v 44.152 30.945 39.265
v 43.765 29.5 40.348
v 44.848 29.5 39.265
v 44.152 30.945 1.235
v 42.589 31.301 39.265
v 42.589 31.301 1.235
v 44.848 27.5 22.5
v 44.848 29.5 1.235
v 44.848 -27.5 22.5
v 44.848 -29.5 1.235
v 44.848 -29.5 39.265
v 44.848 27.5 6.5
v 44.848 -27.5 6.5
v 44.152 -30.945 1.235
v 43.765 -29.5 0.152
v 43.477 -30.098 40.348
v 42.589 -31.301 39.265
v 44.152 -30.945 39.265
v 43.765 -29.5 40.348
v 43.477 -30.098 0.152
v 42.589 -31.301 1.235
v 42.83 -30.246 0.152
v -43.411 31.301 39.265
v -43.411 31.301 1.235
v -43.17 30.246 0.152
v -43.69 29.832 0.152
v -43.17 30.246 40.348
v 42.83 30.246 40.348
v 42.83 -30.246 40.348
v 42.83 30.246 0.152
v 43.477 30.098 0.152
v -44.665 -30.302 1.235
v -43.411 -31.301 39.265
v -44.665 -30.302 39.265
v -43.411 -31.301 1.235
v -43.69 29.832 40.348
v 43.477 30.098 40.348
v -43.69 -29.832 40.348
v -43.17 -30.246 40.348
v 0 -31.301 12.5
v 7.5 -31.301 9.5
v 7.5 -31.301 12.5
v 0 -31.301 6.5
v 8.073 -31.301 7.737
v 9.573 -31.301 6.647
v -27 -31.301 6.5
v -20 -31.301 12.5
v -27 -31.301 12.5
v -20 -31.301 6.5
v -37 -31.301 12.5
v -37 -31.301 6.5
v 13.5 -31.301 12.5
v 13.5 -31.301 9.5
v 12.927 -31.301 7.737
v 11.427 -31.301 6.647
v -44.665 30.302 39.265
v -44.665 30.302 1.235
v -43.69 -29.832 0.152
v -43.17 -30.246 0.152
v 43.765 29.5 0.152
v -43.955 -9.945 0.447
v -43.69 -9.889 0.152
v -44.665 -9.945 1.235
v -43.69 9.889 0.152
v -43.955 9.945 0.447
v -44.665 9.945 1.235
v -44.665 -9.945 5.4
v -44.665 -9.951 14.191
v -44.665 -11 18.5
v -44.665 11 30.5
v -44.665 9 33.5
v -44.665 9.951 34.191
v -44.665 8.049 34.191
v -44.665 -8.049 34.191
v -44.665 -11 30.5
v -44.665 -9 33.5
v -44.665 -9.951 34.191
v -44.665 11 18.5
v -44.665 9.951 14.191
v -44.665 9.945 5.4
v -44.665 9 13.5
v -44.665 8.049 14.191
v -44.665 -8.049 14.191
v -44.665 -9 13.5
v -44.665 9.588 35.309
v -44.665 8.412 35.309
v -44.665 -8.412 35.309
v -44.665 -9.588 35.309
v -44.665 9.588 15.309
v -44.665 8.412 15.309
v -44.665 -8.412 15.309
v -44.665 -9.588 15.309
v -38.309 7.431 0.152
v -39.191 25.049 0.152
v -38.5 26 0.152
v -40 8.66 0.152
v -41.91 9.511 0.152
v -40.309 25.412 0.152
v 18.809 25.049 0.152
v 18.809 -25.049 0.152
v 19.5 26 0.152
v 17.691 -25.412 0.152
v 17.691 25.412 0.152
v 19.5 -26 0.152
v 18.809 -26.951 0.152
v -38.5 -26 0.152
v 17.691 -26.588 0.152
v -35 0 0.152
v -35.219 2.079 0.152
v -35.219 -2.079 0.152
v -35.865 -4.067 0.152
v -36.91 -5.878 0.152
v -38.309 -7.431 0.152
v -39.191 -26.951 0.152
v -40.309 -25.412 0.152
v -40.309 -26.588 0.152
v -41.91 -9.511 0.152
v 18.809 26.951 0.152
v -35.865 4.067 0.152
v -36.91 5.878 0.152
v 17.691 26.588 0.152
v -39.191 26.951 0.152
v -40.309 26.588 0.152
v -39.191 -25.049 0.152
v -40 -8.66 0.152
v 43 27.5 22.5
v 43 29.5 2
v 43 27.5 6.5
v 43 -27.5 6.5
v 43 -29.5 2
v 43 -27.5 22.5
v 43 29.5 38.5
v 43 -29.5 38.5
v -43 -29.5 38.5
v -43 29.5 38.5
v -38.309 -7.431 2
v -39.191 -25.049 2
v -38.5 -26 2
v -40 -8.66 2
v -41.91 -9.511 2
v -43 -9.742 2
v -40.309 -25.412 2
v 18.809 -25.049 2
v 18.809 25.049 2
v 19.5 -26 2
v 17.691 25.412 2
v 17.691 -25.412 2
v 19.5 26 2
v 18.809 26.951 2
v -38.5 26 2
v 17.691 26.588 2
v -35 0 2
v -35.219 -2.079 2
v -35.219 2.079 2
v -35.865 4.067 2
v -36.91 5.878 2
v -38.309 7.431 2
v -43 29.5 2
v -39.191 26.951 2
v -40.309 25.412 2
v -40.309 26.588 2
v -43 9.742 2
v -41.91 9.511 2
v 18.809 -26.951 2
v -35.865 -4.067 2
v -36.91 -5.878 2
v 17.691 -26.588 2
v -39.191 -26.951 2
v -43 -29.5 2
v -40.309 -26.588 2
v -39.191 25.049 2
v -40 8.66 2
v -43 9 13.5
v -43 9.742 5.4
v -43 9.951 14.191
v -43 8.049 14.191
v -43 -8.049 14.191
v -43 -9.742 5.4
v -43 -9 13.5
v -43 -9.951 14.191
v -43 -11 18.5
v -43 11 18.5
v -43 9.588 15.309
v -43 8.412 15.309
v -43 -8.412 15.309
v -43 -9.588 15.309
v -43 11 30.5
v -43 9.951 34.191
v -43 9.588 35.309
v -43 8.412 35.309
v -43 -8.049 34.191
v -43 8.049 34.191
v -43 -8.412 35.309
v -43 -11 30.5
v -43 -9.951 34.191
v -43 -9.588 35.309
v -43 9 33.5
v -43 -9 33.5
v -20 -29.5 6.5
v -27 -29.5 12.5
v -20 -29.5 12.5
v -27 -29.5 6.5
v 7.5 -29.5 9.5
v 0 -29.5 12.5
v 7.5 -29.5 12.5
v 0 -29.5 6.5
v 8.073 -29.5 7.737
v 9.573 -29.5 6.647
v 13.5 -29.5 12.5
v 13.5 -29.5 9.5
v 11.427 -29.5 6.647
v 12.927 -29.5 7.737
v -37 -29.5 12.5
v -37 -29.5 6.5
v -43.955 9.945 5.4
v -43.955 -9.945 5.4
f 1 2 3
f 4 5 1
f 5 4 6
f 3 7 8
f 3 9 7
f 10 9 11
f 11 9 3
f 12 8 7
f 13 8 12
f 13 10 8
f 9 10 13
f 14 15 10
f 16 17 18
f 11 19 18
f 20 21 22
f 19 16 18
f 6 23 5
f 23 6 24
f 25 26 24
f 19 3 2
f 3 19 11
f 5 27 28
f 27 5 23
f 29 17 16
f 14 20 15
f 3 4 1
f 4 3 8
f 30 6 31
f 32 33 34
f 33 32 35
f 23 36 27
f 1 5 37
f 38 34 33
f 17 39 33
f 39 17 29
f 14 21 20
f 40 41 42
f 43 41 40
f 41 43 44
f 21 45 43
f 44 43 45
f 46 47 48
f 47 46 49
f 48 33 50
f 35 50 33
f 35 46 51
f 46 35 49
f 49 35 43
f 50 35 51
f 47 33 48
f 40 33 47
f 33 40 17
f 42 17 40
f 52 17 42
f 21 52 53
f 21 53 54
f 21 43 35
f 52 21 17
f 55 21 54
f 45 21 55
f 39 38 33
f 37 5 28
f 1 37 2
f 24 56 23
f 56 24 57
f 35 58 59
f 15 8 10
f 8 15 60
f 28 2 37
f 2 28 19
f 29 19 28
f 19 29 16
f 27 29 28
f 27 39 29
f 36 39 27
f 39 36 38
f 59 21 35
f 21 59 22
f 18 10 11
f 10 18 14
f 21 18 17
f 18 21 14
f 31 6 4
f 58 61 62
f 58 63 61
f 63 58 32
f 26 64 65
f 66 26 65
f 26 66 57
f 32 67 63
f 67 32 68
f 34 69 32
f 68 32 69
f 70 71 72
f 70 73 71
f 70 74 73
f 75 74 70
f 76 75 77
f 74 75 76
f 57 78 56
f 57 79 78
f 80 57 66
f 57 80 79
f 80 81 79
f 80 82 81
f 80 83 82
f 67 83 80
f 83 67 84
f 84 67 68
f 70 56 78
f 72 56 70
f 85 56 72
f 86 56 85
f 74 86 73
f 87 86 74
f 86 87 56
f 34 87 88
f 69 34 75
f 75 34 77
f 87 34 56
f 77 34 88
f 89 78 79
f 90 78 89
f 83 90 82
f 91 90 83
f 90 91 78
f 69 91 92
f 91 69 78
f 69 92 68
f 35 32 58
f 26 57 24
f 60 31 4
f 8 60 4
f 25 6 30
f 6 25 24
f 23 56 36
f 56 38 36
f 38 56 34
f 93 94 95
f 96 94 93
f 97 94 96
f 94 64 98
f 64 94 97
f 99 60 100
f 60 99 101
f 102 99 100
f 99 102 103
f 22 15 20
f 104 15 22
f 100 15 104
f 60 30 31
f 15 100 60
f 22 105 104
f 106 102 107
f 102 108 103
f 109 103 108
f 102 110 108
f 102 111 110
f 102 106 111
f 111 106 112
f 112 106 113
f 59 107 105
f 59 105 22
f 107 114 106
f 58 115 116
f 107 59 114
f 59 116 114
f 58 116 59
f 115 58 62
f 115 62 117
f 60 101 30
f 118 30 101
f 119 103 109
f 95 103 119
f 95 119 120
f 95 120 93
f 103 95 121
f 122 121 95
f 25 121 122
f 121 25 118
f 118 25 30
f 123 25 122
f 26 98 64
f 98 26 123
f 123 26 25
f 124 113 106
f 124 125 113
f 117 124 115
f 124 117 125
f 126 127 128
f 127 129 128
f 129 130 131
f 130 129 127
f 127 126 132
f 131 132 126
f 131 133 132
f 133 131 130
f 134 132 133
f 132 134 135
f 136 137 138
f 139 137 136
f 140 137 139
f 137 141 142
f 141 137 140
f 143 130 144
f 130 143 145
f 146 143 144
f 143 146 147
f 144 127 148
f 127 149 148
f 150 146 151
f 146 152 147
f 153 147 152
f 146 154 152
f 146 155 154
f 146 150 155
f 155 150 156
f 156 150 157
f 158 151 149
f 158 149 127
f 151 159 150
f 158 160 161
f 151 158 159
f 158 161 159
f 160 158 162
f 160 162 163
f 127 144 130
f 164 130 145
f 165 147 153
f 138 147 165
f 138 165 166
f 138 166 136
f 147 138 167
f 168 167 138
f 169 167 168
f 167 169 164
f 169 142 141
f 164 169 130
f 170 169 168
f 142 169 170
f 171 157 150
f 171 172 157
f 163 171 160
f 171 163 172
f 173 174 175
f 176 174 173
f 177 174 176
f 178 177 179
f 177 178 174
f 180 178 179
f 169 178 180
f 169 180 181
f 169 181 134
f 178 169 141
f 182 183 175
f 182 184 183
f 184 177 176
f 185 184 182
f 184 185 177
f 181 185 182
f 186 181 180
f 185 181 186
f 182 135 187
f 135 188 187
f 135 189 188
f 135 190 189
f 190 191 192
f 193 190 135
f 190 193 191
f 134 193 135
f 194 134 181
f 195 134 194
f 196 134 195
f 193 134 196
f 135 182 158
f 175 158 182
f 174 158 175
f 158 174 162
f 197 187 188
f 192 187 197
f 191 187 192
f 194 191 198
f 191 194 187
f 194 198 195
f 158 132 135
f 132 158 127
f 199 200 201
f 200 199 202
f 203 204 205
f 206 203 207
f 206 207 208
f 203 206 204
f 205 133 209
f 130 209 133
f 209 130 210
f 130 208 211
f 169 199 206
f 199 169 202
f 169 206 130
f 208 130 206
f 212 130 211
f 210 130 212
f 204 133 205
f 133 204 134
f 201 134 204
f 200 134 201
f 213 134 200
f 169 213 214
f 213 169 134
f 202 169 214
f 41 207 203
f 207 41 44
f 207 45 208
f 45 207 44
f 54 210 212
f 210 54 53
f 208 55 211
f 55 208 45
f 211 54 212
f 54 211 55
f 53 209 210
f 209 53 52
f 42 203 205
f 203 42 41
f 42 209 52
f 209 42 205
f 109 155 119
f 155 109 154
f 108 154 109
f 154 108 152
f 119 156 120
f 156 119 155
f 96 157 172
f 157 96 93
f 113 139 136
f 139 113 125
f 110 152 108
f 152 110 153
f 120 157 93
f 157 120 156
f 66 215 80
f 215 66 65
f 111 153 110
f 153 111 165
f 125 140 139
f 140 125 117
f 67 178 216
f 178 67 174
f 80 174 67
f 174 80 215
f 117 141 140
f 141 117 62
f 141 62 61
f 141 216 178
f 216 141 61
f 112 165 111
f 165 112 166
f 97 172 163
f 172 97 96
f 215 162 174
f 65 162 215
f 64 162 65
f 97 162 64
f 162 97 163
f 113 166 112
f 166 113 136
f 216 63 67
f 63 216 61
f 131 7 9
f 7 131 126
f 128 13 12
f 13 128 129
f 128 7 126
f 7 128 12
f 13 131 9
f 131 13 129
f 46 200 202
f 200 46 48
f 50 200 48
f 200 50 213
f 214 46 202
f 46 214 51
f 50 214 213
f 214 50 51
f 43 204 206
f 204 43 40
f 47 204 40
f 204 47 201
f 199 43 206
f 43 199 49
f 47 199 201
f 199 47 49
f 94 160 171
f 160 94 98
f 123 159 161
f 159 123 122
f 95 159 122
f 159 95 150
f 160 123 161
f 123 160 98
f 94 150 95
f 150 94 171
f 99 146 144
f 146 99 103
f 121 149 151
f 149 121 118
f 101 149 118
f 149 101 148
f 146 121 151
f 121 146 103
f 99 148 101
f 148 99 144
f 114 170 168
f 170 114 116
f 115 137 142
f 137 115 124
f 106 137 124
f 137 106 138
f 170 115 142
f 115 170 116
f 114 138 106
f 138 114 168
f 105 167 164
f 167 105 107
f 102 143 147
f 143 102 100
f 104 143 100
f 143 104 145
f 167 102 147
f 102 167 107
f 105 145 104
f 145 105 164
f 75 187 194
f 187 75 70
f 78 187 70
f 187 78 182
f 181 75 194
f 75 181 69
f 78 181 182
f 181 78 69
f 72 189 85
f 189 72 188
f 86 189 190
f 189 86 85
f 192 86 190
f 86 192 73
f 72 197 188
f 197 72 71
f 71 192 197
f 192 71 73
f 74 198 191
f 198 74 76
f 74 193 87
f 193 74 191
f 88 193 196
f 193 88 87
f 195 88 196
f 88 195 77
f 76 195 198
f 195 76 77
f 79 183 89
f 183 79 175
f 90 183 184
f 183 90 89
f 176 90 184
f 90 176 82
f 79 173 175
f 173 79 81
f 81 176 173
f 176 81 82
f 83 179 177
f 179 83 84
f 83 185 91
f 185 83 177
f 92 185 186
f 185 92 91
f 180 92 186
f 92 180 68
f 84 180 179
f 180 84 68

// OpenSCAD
// common

board_height = 1.5;

usb_height = 16;

screen_width=22;
screen_width_outer=24;
screen_height = 12;
screen_height_outer=26;
screen_inner_offset=6;
screen_screw_diameter=2;
screen_screew_offset=2;

minijack_diameter = 6;
minijack_offset = 53.5;

spacer_lower = 3;

box_length_inner = 86;
box_width_inner = 59;
box_height_inner = spacer_lower + board_height + minijack_diameter+screen_height_outer;

box_border_size = 2;

box_length_outer= box_length_inner + box_border_size*2;
box_width_outer = box_width_inner+ box_border_size*2;
box_height_outer = box_height_inner+ box_border_size*2;

power_height= 6;
power_width = 10;
power_offset = 11;

hdmi_height = power_height;
hdmi_width = 20;
hdmi_offset= 33; 

low_vent_rows=14;
low_vent_length=15;
low_vent_width = 2;
low_vent_spread_x=4;
low_vent_spread_y=2;

screw_offset_y = 3.5;
screw_offset_x_front = 3.5;
screw_distance_x= 58;
screw_radius=1;

collision_spacer = 0.1;

module box_inner(){
    cube([box_length_inner, box_width_inner, box_height_inner], center = true);
}

module screen_screw_hole(){
translate([
    -box_length_outer/2-collision_spacer,
   0,
    box_height_inner])
rotate([0,90,0])
cylinder(h=box_border_size+collision_spacer*2,d=screen_screw_diameter);
}

module box_whole(){
    difference(){
        translate([0,0,box_border_size + box_height_inner/2])
        difference(){
            minkowski(){
                box_inner();
                sphere(r=box_border_size);
            };
            
            // inner
            box_inner();
        }
        
        slot_depth = box_border_size+collision_spacer *2;
        
        // sd card slot
        sdcard_slot_height = 0.5 + spacer_lower + box_border_size;
        sdcard_slot_radius= 10;
        
        translate([- box_length_outer/2,0,sdcard_slot_height/2 -collision_spacer])
        cylinder(h = sdcard_slot_height, r=sdcard_slot_radius, center= true);
        
        // usb and rj45
        translate([
            box_length_inner/2 + box_border_size/2 -collision_spacer, 
            0, 
            box_border_size + usb_height/2 + board_height+spacer_lower])
        cube([slot_depth,box_width_inner -4,usb_height],center=true);
        
        // audio jack
        translate([
            - box_length_inner/2+ minijack_offset,
            -box_width_outer/2 + box_border_size + collision_spacer,
            box_border_size+board_height+spacer_lower + minijack_diameter/2])
        rotate([90,0,0])
        union(){
            cylinder(d = minijack_diameter, h = slot_depth);
            translate([-minijack_diameter/2,0,0])
            cube([minijack_diameter,minijack_diameter/2,slot_depth],center=false);
        }
        
        // power usb
        translate([
            -box_length_inner/2+power_offset-power_width/2,
            -box_width_inner/2 - box_border_size + collision_spacer,
            box_border_size + spacer_lower + board_height])
        cube([power_width,slot_depth,power_height], center=false);
        
        // hdmi
        translate([
            -box_length_inner/2+hdmi_offset-hdmi_width/2,
            -box_width_inner/2 - box_border_size + collision_spacer,
            box_border_size + spacer_lower + board_height])
        cube([hdmi_width,slot_depth,hdmi_height], center=false);
        
        // bottom ventilation gaps
        // low_vent_total_length = low_vent_rows * (low_vent_spread_y + low_vent_width);
        // for(i=[0:low_vent_rows]){
        //     translate([low_vent_total_length/2 - low_vent_spread_x*i, low_vent_spread_y,0])
        //     cube([low_vent_width,low_vent_length,box_border_size+collision_spacer*2]);
            
        //     mirror([0,1,0])
        //     translate([low_vent_total_length/2 - low_vent_spread_x*i, low_vent_spread_y,0])
        //     cube([low_vent_width,low_vent_length,box_border_size+collision_spacer*2]);            
        // }
        
        // screw holes        
        translate([-box_length_inner/2+screw_offset_x_front,box_width_inner/2-screw_offset_y,-collision_spacer])
        cylinder(r=screw_radius,h=box_border_size+collision_spacer*2);
        
        translate([-box_length_inner/2+screw_offset_x_front + screw_distance_x,box_width_inner/2-screw_offset_y,-collision_spacer])
        cylinder(r=screw_radius,h=box_border_size+collision_spacer*2);
        
        translate([-box_length_inner/2+screw_offset_x_front,-box_width_inner/2+screw_offset_y,-collision_spacer])
        cylinder(r=screw_radius,h=box_border_size+collision_spacer*2);
        
        translate([-box_length_inner/2+screw_offset_x_front + screw_distance_x,-box_width_inner/2+screw_offset_y,-collision_spacer])
        cylinder(r=screw_radius,h=box_border_size+collision_spacer*2);
        
        // screen
        screen_bottom_offset=box_border_size + spacer_lower + board_height+minijack_diameter+screen_inner_offset;
        
        translate([-box_length_outer/2+collision_spacer+box_border_size,-screen_width/2,screen_bottom_offset])
        rotate([0,0,90])
        cube([screen_width,box_border_size+collision_spacer*2,screen_height]);
        
        // screen screw holes
        translate([0,screen_width/2-screen_screw_diameter,-screen_screew_offset])
        screen_screw_hole();
        translate([0,-screen_width/2+screen_screw_diameter,-screen_screew_offset])
        screen_screw_hole();
        translate([0,screen_width/2-screen_screw_diameter,-screen_height_outer+screen_screw_diameter+screen_screew_offset])
        screen_screw_hole();
        translate([0,-screen_width/2+screen_screw_diameter,-screen_height_outer+screen_screw_diameter+screen_screew_offset])
        screen_screw_hole();
    }
}

// box lower
box_lower_height = box_border_size+ board_height+spacer_lower + minijack_diameter;
module box_lower(){
    difference(){
        box_whole();
        
        translate([0,0,box_height_outer/2 + box_lower_height])
        cube([
            box_length_outer+collision_spacer, 
            box_width_outer +collision_spacer,
            box_height_outer +collision_spacer
        ], center= true);
    }
}

// view

box_whole();
